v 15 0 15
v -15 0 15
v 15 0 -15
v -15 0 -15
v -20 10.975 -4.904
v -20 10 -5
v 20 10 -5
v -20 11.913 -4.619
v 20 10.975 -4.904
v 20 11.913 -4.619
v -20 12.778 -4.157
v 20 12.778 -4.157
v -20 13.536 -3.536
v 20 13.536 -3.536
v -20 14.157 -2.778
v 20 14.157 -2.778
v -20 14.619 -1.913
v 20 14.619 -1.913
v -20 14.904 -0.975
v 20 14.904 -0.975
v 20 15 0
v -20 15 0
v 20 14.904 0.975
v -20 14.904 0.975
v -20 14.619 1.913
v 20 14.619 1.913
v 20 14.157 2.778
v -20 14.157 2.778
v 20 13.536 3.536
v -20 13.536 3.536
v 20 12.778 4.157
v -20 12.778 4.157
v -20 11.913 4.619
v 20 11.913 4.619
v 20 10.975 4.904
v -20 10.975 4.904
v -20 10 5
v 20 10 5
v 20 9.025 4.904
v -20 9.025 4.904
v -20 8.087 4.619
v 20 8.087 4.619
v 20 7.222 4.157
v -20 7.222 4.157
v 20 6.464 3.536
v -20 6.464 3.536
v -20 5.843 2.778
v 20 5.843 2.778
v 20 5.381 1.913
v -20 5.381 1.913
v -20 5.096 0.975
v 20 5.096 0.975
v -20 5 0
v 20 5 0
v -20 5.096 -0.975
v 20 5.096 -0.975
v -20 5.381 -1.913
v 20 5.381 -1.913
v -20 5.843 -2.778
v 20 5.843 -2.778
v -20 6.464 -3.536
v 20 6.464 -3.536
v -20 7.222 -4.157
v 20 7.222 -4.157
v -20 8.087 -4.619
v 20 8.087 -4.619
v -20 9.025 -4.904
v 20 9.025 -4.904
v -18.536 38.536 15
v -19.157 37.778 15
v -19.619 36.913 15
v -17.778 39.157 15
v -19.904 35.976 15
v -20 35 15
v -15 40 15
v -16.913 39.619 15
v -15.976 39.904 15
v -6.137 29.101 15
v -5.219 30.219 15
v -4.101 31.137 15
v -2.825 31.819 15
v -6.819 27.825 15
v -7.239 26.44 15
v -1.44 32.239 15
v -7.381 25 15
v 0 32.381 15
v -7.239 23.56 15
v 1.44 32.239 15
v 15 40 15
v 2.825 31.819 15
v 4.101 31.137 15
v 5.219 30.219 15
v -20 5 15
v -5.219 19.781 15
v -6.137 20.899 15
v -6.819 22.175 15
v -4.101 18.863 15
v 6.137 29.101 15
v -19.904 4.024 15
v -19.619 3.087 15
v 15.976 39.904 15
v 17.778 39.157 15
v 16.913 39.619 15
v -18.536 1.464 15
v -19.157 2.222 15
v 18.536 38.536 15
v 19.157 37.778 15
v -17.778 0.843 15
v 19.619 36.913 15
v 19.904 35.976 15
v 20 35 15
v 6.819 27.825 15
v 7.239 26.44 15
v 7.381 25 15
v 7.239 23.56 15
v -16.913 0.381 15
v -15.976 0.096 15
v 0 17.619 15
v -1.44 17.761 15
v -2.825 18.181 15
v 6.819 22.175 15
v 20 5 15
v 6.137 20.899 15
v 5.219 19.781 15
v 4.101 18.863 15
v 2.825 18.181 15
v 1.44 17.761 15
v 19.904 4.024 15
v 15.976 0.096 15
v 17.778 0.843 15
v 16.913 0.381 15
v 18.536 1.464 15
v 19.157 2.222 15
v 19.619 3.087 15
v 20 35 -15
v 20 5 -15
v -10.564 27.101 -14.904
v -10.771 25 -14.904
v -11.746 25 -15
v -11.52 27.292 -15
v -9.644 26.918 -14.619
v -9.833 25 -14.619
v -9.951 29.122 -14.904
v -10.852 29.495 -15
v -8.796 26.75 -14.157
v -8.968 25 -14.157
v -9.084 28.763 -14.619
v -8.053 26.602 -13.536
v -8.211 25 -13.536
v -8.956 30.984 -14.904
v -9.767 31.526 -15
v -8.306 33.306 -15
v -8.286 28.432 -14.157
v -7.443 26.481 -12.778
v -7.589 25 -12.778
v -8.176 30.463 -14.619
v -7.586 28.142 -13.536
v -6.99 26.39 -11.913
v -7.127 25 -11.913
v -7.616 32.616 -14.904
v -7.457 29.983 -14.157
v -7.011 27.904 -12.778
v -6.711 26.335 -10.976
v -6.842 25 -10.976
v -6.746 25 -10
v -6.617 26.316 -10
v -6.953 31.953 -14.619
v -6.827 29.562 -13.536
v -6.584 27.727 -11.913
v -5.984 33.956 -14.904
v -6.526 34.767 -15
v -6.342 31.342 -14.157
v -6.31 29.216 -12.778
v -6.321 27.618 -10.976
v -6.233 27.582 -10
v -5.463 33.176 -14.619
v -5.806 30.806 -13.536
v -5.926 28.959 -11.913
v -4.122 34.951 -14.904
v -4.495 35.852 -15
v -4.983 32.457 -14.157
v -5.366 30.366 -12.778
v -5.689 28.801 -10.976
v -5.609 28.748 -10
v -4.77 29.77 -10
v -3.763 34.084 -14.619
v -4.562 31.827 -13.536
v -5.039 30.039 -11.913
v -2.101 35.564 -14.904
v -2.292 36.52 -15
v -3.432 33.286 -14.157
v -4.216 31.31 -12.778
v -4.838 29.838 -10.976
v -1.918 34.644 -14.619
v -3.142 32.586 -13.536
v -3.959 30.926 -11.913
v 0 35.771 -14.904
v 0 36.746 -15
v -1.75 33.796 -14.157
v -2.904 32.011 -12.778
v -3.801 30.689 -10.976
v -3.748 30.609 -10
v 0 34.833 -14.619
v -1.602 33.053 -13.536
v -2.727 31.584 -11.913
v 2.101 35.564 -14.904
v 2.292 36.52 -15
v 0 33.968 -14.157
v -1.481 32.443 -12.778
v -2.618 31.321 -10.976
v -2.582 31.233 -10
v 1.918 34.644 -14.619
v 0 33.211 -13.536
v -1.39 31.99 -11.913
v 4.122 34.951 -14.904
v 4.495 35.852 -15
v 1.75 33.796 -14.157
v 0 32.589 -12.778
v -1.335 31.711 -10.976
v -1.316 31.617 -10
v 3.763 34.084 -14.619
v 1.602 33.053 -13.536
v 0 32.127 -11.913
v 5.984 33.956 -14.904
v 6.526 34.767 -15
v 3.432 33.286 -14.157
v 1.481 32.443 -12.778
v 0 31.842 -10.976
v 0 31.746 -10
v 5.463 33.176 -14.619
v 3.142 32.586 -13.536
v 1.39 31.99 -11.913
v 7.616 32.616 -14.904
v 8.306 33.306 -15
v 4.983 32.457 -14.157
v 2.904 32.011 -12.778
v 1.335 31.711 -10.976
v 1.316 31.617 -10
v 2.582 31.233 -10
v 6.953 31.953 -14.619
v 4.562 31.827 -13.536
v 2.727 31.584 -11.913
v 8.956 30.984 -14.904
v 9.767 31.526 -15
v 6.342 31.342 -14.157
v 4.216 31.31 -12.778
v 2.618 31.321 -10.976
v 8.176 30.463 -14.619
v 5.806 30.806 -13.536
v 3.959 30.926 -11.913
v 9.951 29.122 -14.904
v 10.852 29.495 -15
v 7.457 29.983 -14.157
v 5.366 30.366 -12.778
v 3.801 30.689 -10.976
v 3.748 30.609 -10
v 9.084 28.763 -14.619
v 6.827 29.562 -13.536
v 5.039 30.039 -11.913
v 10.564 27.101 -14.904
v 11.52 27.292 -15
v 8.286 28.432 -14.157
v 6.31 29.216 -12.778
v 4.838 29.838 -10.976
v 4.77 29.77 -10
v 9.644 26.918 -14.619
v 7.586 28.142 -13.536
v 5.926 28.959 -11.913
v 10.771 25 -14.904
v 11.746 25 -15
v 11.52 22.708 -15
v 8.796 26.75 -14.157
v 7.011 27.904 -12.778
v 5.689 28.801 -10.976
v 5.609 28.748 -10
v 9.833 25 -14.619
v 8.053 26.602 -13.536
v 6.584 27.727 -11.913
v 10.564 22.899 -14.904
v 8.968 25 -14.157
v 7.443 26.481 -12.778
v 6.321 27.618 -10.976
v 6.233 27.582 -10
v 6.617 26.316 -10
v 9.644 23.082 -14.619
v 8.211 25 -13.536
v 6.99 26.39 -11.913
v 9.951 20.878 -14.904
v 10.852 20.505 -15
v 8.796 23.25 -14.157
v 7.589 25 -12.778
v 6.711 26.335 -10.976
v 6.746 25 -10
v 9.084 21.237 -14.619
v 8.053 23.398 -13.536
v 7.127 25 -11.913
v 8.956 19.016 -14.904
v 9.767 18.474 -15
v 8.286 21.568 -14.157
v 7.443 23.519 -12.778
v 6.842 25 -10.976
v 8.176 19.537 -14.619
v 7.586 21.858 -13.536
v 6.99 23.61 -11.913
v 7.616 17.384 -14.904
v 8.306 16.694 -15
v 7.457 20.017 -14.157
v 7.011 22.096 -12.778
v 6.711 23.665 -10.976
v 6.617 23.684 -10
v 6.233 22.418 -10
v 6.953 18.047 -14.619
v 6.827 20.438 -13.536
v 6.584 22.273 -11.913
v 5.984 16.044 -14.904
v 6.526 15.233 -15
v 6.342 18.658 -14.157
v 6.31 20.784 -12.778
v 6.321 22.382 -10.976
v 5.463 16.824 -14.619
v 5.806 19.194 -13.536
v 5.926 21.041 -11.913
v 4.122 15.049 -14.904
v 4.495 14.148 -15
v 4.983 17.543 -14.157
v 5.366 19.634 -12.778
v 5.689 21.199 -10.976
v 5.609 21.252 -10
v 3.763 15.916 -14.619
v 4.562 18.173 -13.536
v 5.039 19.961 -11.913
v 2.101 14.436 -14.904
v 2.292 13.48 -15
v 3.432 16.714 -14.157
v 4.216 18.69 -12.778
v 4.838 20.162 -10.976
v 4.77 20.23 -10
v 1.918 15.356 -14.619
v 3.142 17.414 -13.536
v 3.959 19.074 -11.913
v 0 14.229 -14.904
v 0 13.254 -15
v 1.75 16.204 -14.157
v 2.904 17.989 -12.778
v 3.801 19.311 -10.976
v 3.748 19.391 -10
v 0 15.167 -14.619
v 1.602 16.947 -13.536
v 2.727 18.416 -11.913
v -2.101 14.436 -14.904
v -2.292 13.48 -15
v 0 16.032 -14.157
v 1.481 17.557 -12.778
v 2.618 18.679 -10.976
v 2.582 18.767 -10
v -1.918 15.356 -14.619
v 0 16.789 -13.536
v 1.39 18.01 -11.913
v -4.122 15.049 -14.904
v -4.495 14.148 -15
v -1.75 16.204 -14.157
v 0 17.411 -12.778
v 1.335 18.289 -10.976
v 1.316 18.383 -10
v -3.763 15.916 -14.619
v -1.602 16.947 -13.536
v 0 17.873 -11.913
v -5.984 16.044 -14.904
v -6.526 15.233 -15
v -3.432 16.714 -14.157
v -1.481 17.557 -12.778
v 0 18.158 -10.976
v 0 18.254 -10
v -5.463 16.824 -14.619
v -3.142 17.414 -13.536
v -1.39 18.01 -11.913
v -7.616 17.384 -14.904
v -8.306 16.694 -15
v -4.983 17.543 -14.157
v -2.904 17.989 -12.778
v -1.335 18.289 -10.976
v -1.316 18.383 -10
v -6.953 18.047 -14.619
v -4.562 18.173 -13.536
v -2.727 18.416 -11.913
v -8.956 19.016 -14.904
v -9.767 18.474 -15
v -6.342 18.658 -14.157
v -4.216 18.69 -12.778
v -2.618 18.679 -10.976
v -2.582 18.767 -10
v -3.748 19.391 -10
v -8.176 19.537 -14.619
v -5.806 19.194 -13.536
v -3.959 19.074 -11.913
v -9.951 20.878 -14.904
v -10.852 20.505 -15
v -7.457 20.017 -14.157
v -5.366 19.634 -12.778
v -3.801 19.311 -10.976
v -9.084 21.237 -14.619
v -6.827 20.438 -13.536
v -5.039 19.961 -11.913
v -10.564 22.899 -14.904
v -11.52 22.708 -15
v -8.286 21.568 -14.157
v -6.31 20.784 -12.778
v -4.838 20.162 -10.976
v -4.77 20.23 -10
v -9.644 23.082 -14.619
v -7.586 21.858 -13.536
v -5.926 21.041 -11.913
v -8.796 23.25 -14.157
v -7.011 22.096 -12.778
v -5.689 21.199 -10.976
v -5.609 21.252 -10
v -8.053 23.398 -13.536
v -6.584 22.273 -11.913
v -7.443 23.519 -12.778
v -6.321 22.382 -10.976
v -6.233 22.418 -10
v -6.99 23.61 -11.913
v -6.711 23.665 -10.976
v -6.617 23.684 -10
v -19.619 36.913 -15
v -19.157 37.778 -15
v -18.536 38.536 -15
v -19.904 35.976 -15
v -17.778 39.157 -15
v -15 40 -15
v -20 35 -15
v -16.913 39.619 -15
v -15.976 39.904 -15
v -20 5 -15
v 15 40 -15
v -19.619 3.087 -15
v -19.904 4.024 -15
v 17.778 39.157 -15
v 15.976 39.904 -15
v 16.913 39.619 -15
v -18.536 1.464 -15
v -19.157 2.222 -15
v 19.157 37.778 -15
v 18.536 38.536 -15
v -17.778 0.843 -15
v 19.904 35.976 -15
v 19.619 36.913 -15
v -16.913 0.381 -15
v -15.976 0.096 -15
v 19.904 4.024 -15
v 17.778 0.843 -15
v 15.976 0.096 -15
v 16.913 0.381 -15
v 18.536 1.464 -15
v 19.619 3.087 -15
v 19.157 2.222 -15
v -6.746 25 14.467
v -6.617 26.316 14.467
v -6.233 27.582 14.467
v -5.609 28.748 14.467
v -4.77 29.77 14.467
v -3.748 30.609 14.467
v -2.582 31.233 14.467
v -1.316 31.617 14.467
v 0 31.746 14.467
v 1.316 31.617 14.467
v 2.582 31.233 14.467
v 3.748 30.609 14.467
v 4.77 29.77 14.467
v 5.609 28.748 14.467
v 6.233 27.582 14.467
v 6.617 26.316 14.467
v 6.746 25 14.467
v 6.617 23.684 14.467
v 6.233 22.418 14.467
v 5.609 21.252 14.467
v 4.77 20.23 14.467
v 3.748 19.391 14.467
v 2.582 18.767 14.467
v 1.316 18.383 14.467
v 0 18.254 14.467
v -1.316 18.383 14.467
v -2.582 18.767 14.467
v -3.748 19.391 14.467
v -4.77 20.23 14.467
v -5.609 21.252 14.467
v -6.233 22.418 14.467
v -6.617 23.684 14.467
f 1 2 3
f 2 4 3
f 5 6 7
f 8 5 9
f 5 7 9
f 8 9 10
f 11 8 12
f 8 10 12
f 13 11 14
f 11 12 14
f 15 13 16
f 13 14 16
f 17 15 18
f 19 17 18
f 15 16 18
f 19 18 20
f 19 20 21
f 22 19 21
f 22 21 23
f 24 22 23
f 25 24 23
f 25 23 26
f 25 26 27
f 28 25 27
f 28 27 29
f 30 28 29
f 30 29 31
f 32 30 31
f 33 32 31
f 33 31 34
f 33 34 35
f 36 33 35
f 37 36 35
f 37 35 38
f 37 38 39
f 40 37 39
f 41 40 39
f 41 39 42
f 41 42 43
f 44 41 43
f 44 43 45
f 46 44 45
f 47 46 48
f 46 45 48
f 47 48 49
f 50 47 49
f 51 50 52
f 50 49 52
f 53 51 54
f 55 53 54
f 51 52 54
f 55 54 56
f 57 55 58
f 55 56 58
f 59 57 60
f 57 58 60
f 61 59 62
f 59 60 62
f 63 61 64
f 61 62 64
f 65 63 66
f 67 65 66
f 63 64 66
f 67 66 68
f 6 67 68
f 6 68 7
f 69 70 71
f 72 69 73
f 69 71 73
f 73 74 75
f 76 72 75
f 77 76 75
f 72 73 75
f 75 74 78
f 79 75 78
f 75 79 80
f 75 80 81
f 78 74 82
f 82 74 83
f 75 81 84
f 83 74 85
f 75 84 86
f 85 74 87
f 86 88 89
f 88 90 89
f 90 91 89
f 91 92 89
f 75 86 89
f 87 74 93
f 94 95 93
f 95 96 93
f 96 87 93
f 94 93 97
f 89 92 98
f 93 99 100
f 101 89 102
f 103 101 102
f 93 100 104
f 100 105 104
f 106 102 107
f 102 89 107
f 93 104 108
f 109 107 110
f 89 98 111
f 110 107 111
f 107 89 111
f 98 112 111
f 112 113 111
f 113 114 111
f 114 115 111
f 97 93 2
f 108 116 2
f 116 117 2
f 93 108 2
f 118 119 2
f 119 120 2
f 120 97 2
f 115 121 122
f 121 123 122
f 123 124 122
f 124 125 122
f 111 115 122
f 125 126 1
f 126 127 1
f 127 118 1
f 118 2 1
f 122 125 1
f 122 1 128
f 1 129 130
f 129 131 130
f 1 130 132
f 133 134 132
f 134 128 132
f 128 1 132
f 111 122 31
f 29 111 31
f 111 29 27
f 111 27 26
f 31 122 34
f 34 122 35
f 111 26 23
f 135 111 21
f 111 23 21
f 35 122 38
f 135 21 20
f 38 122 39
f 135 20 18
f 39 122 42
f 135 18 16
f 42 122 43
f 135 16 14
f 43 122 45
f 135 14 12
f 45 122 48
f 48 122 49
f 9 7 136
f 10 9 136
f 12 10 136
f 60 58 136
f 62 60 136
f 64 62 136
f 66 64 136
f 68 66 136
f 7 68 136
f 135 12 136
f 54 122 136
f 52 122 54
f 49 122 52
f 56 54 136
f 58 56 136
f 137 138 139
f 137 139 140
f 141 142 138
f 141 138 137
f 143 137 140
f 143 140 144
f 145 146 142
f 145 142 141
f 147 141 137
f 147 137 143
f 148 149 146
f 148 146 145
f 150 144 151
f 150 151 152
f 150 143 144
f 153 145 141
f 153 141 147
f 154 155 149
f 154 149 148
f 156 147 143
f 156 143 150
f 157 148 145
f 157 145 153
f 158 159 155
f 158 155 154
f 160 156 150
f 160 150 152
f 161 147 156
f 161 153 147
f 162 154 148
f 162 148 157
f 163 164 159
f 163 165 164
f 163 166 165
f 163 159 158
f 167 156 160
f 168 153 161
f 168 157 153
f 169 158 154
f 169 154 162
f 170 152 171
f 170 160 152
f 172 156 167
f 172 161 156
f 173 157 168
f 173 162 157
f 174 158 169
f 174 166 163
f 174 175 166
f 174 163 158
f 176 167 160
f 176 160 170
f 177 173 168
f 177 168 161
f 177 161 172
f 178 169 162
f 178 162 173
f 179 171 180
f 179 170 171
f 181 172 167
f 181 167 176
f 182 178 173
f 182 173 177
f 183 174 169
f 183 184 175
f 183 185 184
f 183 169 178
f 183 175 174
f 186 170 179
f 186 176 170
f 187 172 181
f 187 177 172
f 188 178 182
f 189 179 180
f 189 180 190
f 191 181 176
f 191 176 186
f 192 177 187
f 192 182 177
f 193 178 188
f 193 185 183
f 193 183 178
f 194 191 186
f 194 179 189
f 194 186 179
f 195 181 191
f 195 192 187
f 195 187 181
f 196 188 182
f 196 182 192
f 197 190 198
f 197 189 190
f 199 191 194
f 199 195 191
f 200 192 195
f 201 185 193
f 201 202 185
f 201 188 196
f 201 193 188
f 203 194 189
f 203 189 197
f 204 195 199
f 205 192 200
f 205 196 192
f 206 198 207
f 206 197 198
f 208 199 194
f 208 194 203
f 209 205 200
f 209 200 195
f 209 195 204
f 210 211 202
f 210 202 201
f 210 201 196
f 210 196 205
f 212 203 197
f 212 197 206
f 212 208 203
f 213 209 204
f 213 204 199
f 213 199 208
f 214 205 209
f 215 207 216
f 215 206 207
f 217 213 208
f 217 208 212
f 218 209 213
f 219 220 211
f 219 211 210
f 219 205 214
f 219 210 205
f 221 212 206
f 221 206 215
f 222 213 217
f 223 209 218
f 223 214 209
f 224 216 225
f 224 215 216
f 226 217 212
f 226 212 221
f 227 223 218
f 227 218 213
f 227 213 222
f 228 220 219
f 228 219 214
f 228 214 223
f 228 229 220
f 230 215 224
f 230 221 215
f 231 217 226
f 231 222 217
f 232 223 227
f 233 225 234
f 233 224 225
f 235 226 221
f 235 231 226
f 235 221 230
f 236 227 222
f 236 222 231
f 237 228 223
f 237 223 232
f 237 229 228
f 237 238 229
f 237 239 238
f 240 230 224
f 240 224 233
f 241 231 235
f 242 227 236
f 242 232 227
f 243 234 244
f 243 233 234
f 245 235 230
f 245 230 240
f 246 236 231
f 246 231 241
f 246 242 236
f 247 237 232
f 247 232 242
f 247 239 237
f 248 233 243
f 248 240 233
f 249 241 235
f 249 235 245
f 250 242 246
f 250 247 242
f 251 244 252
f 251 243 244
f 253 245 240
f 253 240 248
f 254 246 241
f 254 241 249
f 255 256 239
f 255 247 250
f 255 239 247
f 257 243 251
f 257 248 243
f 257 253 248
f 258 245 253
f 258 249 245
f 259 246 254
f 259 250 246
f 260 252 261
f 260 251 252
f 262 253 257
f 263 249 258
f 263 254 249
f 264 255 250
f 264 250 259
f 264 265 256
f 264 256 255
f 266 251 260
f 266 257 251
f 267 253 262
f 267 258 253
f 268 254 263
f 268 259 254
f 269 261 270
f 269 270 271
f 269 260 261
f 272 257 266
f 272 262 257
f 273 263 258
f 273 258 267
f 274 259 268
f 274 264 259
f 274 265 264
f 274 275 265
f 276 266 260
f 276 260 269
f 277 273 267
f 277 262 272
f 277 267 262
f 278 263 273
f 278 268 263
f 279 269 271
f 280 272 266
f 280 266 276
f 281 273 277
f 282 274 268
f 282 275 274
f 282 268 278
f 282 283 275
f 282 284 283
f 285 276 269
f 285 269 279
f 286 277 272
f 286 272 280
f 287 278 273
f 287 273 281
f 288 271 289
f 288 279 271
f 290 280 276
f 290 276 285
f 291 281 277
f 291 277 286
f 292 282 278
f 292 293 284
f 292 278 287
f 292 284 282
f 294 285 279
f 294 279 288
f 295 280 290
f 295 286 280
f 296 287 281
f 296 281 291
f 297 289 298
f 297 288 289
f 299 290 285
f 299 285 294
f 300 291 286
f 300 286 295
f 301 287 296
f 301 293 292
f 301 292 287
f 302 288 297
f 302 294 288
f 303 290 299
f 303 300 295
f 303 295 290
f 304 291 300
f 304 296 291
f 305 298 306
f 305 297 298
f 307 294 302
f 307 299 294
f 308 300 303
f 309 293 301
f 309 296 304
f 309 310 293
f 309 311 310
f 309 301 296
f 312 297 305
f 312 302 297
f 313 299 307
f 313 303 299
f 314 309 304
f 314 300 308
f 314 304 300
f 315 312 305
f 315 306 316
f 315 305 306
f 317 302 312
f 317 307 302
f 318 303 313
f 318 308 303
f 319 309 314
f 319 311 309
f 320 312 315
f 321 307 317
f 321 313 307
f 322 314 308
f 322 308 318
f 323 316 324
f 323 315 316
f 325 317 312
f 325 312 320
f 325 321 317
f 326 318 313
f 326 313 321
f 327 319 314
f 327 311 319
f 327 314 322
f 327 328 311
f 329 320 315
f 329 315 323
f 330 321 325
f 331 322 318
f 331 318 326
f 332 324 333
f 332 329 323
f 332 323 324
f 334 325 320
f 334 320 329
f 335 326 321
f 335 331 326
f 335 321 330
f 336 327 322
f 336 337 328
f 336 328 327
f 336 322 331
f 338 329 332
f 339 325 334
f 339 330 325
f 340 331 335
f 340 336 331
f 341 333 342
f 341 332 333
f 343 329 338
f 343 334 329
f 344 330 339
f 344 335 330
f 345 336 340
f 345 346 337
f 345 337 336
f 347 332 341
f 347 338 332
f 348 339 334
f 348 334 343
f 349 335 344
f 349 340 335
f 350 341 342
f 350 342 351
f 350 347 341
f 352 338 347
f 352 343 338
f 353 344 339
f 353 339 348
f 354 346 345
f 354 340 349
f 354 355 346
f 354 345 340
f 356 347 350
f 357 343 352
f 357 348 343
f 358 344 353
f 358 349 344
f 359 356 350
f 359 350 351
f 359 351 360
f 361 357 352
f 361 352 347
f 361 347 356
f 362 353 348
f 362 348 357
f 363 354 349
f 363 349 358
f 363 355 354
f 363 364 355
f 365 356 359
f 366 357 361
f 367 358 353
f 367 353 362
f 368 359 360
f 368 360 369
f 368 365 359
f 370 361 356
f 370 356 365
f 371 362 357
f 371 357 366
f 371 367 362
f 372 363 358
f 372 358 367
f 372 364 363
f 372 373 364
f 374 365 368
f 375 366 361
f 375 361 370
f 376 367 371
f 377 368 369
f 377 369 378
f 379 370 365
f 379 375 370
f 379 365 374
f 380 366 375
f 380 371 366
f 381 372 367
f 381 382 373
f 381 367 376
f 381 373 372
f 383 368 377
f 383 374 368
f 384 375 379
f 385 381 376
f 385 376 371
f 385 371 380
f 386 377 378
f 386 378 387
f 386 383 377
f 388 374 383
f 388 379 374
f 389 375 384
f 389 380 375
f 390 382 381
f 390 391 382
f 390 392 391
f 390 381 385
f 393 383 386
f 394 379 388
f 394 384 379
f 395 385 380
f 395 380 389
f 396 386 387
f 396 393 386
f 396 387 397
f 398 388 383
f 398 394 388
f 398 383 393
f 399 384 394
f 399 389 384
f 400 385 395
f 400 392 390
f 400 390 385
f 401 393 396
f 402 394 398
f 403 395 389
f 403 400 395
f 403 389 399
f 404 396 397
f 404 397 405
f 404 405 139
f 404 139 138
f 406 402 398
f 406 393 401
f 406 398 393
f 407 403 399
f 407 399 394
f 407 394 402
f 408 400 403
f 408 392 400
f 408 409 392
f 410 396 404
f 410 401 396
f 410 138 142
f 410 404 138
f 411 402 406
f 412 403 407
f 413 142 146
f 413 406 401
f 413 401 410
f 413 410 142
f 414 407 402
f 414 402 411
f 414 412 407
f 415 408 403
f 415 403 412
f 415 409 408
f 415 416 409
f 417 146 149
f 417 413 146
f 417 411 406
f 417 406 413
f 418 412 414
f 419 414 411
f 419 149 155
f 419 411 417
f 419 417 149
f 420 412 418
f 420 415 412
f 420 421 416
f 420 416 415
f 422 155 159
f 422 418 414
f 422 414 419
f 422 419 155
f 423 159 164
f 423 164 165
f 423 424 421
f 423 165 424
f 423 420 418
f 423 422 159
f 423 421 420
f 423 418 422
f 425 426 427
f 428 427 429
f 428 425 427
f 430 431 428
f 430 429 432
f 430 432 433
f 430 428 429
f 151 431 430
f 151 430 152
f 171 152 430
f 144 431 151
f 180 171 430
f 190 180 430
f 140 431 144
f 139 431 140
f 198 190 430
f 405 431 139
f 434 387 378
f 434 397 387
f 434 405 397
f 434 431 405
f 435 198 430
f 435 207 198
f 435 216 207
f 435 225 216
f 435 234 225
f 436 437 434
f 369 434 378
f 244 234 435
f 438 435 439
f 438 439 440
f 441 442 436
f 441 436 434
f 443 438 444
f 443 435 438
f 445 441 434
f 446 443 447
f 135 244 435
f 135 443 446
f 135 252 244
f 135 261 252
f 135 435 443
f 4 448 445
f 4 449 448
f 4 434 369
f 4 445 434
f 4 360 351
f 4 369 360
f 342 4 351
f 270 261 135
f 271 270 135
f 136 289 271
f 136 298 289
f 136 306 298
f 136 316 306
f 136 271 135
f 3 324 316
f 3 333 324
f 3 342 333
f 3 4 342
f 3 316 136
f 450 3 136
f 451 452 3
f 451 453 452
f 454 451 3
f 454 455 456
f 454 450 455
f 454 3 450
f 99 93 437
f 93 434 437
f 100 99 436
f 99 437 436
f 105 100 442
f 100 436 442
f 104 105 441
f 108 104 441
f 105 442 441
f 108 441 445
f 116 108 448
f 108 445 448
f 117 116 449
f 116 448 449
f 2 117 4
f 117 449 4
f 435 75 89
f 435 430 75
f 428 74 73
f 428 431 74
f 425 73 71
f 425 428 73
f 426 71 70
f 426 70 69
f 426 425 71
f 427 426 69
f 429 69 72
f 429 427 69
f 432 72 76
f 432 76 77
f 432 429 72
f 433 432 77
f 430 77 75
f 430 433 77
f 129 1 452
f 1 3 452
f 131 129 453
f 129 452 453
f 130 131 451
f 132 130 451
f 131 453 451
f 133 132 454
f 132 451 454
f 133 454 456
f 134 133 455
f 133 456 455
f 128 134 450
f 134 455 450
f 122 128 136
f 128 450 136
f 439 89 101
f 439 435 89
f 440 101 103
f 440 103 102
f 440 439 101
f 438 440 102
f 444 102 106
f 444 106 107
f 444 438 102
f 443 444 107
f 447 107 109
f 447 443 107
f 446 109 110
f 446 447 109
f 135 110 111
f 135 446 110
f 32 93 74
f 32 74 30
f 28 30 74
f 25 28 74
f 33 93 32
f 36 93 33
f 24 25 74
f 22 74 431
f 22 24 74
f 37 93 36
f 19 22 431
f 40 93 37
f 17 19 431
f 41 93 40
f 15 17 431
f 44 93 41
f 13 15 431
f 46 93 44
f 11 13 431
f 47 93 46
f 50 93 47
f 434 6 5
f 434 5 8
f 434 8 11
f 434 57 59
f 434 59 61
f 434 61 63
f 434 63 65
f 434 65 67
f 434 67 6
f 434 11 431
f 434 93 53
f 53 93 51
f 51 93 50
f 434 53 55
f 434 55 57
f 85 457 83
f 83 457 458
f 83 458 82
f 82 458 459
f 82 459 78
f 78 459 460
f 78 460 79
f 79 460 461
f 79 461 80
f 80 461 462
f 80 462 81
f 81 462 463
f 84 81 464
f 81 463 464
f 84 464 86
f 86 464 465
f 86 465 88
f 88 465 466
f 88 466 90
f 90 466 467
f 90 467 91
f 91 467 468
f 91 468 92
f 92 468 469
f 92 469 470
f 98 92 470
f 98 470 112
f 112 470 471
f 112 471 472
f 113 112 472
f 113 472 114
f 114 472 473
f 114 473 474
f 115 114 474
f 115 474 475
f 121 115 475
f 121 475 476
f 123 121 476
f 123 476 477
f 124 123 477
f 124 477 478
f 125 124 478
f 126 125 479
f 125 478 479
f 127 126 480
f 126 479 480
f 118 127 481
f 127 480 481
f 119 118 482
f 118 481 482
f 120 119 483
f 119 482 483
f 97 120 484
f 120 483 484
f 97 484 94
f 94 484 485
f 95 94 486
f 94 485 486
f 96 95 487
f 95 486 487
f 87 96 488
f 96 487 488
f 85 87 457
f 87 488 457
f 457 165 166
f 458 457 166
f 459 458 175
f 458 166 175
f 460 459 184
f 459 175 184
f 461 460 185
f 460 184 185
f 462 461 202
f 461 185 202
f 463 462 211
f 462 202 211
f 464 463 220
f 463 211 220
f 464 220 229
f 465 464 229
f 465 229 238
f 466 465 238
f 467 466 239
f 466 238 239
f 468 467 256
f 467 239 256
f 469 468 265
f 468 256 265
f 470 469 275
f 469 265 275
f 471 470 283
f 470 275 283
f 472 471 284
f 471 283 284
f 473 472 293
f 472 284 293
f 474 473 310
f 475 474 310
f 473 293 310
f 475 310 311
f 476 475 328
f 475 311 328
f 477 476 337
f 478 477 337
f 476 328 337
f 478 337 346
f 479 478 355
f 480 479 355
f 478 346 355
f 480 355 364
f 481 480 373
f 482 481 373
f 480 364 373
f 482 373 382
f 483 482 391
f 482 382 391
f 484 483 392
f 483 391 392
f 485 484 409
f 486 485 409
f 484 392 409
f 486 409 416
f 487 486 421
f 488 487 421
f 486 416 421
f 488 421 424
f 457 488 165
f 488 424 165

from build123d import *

# Parameters (mm, degrees)
SKETCH1_W                         = 40
SKETCH1_H                         = 30
BOSS_EXTRUDE1_DEPTH               = 40
F_1_2_CLEARANCE_HOLE1_D           = 13.49248
F_1_2_CLEARANCE_HOLE1_CSINK_D     = 14.76248
F_1_2_CLEARANCE_HOLE1_CSINK_ANGLE = 100
CUT_EXTRUDE1_REACH                = 60.523
SKETCH4_R                         = 5
FILLET1_R                         = 5


with BuildPart() as part:
    # Sketch1 → Boss-Extrude1 (new body)
    with BuildSketch(Plane(origin=(0, 0, 0), x_dir=(1, 0, 0), z_dir=(0, 1, 0))):
        Rectangle(SKETCH1_W, SKETCH1_H)
    extrude(amount=BOSS_EXTRUDE1_DEPTH)

    # 1/2 Clearance Hole1 (through all)
    with Locations(Plane.XY.offset(15)):
        with Locations((0, 25)):
            CounterSinkHole(F_1_2_CLEARANCE_HOLE1_D / 2, F_1_2_CLEARANCE_HOLE1_CSINK_D / 2, counter_sink_angle=F_1_2_CLEARANCE_HOLE1_CSINK_ANGLE)

    # Sketch4 → Cut-Extrude1 (cut, up to next)
    with BuildSketch(Plane(origin=(20, 0, 0), x_dir=(0, 0, -1), z_dir=(1, 0, 0)), mode=Mode.PRIVATE) as cut_extrude1_sk1:
        with Locations((0, 10)):
            Circle(SKETCH4_R)
    cut_extrude1_tool1 = extrude(cut_extrude1_sk1.sketch, amount=-CUT_EXTRUDE1_REACH, mode=Mode.PRIVATE) & part.part
    add(cut_extrude1_tool1.solids().sort_by_distance((20, 10, 0))[0], mode=Mode.SUBTRACT)

    # Fillet1
    fillet1_edges = [part.edges().sort_by_distance(p)[0] for p in [
        (-20, 40, 0),
        (6.74624, 25, -15),
        (20, 40, 0),
        (-20, 0, 0),
        (20, 0, 0),
    ]]
    fillet(fillet1_edges, radius=FILLET1_R - 0.0001)  # a hair under: the kernel refuses the full size


solid = part.part
